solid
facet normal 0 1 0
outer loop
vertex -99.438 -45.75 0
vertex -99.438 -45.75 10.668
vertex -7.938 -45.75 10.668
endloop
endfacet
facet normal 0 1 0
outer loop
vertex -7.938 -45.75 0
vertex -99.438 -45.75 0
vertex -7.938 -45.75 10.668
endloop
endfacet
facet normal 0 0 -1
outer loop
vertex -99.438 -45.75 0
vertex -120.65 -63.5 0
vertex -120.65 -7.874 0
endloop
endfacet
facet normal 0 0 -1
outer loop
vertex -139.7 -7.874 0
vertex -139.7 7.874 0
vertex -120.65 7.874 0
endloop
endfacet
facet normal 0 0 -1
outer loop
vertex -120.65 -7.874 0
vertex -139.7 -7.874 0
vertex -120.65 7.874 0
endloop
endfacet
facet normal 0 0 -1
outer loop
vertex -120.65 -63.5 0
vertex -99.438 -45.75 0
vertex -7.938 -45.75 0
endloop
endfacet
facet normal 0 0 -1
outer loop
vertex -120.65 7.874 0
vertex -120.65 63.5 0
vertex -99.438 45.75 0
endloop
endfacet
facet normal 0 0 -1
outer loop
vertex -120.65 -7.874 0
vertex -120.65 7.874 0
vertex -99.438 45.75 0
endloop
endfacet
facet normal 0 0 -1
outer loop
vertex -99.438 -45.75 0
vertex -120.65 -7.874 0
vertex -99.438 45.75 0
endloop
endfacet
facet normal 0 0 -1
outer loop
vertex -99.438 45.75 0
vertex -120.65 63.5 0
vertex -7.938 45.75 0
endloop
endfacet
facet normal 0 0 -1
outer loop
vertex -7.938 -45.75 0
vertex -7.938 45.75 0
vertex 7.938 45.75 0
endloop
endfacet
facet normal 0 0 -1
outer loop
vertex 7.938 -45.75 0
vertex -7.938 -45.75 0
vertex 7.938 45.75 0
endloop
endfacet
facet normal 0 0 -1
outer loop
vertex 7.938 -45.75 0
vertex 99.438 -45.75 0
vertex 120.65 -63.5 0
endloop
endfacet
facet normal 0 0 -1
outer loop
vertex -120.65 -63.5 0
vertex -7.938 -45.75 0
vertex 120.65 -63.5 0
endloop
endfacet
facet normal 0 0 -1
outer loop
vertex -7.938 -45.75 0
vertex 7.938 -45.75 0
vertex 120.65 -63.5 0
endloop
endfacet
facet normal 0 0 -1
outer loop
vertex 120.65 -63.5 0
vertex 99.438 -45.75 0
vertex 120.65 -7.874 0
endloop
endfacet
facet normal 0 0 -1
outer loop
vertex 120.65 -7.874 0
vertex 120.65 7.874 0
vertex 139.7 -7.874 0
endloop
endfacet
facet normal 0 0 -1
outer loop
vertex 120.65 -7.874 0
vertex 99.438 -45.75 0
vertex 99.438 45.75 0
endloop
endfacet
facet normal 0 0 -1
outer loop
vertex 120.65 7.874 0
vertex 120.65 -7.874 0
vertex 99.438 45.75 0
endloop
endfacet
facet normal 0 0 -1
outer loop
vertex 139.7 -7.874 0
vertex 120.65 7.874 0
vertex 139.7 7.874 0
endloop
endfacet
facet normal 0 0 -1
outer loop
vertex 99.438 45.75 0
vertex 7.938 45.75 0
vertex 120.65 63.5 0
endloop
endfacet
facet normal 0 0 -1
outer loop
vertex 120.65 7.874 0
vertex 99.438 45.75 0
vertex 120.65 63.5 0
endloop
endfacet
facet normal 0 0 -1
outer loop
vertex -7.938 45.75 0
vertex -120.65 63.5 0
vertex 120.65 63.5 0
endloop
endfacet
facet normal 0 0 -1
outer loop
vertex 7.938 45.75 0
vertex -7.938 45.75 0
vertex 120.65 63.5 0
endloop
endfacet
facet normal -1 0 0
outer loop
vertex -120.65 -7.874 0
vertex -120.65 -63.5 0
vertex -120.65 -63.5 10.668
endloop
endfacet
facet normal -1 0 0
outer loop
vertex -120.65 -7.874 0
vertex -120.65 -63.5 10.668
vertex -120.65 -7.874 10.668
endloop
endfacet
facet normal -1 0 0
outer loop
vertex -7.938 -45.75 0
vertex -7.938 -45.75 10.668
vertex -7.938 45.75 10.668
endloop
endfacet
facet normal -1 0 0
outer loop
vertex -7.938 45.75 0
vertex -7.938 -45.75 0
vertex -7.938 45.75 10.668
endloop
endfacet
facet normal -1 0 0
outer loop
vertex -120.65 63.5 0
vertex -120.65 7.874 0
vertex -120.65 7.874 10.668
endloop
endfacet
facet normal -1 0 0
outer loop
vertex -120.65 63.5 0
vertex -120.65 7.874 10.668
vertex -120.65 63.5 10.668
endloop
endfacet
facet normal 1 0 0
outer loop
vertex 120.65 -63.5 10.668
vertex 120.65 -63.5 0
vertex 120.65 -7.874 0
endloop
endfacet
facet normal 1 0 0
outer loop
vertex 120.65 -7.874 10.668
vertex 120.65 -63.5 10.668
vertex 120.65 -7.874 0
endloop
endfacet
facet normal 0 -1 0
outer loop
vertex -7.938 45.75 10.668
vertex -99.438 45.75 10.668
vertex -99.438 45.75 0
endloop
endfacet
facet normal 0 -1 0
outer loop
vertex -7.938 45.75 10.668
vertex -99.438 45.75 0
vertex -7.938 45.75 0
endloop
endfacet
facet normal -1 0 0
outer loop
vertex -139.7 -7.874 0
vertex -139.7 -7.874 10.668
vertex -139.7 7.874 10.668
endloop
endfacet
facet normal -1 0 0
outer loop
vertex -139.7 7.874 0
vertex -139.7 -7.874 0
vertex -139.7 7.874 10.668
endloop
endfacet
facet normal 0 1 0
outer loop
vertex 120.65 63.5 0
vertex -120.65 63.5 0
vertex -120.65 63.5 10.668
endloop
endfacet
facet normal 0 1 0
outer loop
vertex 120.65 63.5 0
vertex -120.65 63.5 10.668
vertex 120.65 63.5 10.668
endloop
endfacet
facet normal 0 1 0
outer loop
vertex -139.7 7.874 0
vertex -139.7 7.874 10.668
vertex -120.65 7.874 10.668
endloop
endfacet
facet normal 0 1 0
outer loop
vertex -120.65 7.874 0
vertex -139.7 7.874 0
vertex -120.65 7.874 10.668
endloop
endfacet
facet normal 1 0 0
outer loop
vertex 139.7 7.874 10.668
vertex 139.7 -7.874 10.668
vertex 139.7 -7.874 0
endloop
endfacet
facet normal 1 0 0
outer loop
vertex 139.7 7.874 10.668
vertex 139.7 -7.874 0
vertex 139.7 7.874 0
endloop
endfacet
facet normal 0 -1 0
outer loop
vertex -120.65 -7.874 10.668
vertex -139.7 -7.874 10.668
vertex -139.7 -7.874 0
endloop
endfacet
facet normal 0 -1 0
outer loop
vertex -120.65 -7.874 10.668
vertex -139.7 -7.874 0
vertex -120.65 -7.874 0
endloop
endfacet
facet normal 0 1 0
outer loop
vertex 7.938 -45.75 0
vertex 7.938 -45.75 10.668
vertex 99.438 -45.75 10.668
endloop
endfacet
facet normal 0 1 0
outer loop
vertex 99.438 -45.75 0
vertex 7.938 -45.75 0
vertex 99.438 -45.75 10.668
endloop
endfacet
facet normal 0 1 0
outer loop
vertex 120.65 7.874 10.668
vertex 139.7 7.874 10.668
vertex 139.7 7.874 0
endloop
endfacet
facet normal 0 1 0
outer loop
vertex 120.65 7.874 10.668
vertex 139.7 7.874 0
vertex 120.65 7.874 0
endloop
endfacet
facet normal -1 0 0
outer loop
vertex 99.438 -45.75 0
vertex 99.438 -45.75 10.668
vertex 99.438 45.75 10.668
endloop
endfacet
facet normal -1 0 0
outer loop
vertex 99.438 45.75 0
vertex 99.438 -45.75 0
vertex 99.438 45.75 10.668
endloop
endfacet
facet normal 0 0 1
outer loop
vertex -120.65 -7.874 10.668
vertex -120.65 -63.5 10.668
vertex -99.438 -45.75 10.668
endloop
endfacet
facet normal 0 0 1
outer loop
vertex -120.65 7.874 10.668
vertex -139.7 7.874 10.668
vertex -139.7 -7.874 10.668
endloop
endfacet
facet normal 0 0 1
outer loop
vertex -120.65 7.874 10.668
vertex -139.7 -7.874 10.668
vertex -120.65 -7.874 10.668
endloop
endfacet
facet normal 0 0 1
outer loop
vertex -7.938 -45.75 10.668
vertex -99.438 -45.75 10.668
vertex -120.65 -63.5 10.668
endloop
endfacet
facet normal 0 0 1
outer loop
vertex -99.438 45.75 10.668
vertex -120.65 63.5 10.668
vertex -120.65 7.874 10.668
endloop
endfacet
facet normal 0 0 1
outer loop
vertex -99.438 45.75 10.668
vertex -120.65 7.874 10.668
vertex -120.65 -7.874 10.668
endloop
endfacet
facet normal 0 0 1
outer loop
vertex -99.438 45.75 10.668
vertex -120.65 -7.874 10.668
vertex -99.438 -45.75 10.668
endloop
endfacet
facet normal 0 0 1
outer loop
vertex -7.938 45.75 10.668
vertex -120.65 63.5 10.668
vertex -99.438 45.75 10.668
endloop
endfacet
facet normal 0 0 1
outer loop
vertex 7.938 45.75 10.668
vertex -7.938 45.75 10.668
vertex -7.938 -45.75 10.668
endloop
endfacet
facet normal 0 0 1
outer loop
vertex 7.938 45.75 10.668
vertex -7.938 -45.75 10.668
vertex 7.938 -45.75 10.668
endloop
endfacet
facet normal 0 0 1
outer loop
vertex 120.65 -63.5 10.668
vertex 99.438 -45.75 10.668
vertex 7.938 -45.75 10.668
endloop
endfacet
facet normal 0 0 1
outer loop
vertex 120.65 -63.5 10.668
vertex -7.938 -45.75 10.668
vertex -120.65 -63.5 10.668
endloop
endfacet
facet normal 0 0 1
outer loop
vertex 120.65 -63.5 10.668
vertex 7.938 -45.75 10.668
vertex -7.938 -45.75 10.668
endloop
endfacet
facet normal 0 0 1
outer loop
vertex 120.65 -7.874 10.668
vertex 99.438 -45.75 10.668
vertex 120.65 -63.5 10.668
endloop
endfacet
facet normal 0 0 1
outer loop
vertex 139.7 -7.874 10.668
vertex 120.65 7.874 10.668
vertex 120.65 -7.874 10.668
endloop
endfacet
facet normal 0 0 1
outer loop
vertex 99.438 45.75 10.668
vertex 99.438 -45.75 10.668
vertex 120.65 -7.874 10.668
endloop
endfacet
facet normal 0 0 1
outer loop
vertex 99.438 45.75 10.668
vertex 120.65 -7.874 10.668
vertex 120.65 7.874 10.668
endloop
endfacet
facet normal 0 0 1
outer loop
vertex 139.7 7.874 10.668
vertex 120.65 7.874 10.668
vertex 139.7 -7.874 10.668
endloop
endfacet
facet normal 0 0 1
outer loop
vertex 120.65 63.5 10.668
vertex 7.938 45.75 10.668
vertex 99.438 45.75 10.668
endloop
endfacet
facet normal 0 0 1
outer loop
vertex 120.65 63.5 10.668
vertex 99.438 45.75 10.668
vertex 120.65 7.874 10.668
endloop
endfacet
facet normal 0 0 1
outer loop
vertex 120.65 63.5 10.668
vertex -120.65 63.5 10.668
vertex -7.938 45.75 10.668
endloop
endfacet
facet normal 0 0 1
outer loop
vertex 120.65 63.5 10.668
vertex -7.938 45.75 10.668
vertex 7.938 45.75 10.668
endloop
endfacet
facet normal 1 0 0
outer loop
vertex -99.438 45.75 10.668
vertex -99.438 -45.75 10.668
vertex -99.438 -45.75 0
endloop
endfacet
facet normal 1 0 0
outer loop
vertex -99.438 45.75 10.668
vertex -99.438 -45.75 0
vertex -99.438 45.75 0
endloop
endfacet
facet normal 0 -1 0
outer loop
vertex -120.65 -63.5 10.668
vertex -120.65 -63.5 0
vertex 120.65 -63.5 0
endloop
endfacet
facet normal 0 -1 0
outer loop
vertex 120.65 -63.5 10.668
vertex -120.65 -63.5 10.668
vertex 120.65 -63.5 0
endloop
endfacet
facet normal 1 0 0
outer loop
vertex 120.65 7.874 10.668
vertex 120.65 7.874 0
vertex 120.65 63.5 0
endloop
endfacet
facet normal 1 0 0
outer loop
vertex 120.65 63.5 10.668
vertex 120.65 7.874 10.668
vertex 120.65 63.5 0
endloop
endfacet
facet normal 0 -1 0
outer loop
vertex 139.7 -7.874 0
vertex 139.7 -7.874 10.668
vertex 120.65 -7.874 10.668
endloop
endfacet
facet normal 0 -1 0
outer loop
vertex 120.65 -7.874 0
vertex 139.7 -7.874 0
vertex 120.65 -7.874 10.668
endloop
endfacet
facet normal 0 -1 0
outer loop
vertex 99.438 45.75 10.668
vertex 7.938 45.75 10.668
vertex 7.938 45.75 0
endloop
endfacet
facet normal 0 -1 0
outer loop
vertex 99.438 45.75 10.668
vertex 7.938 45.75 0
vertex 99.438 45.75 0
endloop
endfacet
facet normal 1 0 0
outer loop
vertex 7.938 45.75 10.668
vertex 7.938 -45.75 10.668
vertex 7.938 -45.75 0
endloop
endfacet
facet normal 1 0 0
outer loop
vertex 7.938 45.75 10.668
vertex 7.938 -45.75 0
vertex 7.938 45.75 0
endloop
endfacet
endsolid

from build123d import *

# Parameters (mm, degrees)
SKETCH1_W           = 241.3
SKETCH1_H           = 127
BOSS_EXTRUDE1_DEPTH = 10.668
SKETCH3_W           = 91.5
SKETCH3_H           = 91.5
CUT_EXTRUDE1_DEPTH  = 137.757006124
SKETCH4_W           = 19.05
SKETCH4_H           = 15.748
BOSS_EXTRUDE2_DEPTH = 10.668


with BuildPart() as part:
    # Sketch1 → Boss-Extrude1 (new body)
    with BuildSketch(Plane.XY):
        Rectangle(SKETCH1_W, SKETCH1_H)
    extrude(amount=BOSS_EXTRUDE1_DEPTH)

    # Sketch3 → Cut-Extrude1 (cut, through all)
    with BuildSketch(Plane.XY.offset(10.668)):
        with Locations((-53.6875, 0)):
            Rectangle(SKETCH3_W, SKETCH3_H)
        with Locations((53.6875, 0)):
            Rectangle(SKETCH3_W, SKETCH3_H)
    extrude(amount=-CUT_EXTRUDE1_DEPTH, mode=Mode.SUBTRACT)

    # Sketch4 → Boss-Extrude2 (add, through all)
    with BuildSketch(Plane.XY.offset(10.668)):
        with Locations((-130.175, 0)):
            Rectangle(SKETCH4_W, SKETCH4_H)
    boss_extrude2 = extrude(amount=-BOSS_EXTRUDE2_DEPTH)

    # Mirror1: Boss-Extrude2 across plane
    add(boss_extrude2.mirror(Plane(origin=(0, 0, 0), x_dir=(0, 0, 1), z_dir=(1, 0, 0))))


solid = part.part
